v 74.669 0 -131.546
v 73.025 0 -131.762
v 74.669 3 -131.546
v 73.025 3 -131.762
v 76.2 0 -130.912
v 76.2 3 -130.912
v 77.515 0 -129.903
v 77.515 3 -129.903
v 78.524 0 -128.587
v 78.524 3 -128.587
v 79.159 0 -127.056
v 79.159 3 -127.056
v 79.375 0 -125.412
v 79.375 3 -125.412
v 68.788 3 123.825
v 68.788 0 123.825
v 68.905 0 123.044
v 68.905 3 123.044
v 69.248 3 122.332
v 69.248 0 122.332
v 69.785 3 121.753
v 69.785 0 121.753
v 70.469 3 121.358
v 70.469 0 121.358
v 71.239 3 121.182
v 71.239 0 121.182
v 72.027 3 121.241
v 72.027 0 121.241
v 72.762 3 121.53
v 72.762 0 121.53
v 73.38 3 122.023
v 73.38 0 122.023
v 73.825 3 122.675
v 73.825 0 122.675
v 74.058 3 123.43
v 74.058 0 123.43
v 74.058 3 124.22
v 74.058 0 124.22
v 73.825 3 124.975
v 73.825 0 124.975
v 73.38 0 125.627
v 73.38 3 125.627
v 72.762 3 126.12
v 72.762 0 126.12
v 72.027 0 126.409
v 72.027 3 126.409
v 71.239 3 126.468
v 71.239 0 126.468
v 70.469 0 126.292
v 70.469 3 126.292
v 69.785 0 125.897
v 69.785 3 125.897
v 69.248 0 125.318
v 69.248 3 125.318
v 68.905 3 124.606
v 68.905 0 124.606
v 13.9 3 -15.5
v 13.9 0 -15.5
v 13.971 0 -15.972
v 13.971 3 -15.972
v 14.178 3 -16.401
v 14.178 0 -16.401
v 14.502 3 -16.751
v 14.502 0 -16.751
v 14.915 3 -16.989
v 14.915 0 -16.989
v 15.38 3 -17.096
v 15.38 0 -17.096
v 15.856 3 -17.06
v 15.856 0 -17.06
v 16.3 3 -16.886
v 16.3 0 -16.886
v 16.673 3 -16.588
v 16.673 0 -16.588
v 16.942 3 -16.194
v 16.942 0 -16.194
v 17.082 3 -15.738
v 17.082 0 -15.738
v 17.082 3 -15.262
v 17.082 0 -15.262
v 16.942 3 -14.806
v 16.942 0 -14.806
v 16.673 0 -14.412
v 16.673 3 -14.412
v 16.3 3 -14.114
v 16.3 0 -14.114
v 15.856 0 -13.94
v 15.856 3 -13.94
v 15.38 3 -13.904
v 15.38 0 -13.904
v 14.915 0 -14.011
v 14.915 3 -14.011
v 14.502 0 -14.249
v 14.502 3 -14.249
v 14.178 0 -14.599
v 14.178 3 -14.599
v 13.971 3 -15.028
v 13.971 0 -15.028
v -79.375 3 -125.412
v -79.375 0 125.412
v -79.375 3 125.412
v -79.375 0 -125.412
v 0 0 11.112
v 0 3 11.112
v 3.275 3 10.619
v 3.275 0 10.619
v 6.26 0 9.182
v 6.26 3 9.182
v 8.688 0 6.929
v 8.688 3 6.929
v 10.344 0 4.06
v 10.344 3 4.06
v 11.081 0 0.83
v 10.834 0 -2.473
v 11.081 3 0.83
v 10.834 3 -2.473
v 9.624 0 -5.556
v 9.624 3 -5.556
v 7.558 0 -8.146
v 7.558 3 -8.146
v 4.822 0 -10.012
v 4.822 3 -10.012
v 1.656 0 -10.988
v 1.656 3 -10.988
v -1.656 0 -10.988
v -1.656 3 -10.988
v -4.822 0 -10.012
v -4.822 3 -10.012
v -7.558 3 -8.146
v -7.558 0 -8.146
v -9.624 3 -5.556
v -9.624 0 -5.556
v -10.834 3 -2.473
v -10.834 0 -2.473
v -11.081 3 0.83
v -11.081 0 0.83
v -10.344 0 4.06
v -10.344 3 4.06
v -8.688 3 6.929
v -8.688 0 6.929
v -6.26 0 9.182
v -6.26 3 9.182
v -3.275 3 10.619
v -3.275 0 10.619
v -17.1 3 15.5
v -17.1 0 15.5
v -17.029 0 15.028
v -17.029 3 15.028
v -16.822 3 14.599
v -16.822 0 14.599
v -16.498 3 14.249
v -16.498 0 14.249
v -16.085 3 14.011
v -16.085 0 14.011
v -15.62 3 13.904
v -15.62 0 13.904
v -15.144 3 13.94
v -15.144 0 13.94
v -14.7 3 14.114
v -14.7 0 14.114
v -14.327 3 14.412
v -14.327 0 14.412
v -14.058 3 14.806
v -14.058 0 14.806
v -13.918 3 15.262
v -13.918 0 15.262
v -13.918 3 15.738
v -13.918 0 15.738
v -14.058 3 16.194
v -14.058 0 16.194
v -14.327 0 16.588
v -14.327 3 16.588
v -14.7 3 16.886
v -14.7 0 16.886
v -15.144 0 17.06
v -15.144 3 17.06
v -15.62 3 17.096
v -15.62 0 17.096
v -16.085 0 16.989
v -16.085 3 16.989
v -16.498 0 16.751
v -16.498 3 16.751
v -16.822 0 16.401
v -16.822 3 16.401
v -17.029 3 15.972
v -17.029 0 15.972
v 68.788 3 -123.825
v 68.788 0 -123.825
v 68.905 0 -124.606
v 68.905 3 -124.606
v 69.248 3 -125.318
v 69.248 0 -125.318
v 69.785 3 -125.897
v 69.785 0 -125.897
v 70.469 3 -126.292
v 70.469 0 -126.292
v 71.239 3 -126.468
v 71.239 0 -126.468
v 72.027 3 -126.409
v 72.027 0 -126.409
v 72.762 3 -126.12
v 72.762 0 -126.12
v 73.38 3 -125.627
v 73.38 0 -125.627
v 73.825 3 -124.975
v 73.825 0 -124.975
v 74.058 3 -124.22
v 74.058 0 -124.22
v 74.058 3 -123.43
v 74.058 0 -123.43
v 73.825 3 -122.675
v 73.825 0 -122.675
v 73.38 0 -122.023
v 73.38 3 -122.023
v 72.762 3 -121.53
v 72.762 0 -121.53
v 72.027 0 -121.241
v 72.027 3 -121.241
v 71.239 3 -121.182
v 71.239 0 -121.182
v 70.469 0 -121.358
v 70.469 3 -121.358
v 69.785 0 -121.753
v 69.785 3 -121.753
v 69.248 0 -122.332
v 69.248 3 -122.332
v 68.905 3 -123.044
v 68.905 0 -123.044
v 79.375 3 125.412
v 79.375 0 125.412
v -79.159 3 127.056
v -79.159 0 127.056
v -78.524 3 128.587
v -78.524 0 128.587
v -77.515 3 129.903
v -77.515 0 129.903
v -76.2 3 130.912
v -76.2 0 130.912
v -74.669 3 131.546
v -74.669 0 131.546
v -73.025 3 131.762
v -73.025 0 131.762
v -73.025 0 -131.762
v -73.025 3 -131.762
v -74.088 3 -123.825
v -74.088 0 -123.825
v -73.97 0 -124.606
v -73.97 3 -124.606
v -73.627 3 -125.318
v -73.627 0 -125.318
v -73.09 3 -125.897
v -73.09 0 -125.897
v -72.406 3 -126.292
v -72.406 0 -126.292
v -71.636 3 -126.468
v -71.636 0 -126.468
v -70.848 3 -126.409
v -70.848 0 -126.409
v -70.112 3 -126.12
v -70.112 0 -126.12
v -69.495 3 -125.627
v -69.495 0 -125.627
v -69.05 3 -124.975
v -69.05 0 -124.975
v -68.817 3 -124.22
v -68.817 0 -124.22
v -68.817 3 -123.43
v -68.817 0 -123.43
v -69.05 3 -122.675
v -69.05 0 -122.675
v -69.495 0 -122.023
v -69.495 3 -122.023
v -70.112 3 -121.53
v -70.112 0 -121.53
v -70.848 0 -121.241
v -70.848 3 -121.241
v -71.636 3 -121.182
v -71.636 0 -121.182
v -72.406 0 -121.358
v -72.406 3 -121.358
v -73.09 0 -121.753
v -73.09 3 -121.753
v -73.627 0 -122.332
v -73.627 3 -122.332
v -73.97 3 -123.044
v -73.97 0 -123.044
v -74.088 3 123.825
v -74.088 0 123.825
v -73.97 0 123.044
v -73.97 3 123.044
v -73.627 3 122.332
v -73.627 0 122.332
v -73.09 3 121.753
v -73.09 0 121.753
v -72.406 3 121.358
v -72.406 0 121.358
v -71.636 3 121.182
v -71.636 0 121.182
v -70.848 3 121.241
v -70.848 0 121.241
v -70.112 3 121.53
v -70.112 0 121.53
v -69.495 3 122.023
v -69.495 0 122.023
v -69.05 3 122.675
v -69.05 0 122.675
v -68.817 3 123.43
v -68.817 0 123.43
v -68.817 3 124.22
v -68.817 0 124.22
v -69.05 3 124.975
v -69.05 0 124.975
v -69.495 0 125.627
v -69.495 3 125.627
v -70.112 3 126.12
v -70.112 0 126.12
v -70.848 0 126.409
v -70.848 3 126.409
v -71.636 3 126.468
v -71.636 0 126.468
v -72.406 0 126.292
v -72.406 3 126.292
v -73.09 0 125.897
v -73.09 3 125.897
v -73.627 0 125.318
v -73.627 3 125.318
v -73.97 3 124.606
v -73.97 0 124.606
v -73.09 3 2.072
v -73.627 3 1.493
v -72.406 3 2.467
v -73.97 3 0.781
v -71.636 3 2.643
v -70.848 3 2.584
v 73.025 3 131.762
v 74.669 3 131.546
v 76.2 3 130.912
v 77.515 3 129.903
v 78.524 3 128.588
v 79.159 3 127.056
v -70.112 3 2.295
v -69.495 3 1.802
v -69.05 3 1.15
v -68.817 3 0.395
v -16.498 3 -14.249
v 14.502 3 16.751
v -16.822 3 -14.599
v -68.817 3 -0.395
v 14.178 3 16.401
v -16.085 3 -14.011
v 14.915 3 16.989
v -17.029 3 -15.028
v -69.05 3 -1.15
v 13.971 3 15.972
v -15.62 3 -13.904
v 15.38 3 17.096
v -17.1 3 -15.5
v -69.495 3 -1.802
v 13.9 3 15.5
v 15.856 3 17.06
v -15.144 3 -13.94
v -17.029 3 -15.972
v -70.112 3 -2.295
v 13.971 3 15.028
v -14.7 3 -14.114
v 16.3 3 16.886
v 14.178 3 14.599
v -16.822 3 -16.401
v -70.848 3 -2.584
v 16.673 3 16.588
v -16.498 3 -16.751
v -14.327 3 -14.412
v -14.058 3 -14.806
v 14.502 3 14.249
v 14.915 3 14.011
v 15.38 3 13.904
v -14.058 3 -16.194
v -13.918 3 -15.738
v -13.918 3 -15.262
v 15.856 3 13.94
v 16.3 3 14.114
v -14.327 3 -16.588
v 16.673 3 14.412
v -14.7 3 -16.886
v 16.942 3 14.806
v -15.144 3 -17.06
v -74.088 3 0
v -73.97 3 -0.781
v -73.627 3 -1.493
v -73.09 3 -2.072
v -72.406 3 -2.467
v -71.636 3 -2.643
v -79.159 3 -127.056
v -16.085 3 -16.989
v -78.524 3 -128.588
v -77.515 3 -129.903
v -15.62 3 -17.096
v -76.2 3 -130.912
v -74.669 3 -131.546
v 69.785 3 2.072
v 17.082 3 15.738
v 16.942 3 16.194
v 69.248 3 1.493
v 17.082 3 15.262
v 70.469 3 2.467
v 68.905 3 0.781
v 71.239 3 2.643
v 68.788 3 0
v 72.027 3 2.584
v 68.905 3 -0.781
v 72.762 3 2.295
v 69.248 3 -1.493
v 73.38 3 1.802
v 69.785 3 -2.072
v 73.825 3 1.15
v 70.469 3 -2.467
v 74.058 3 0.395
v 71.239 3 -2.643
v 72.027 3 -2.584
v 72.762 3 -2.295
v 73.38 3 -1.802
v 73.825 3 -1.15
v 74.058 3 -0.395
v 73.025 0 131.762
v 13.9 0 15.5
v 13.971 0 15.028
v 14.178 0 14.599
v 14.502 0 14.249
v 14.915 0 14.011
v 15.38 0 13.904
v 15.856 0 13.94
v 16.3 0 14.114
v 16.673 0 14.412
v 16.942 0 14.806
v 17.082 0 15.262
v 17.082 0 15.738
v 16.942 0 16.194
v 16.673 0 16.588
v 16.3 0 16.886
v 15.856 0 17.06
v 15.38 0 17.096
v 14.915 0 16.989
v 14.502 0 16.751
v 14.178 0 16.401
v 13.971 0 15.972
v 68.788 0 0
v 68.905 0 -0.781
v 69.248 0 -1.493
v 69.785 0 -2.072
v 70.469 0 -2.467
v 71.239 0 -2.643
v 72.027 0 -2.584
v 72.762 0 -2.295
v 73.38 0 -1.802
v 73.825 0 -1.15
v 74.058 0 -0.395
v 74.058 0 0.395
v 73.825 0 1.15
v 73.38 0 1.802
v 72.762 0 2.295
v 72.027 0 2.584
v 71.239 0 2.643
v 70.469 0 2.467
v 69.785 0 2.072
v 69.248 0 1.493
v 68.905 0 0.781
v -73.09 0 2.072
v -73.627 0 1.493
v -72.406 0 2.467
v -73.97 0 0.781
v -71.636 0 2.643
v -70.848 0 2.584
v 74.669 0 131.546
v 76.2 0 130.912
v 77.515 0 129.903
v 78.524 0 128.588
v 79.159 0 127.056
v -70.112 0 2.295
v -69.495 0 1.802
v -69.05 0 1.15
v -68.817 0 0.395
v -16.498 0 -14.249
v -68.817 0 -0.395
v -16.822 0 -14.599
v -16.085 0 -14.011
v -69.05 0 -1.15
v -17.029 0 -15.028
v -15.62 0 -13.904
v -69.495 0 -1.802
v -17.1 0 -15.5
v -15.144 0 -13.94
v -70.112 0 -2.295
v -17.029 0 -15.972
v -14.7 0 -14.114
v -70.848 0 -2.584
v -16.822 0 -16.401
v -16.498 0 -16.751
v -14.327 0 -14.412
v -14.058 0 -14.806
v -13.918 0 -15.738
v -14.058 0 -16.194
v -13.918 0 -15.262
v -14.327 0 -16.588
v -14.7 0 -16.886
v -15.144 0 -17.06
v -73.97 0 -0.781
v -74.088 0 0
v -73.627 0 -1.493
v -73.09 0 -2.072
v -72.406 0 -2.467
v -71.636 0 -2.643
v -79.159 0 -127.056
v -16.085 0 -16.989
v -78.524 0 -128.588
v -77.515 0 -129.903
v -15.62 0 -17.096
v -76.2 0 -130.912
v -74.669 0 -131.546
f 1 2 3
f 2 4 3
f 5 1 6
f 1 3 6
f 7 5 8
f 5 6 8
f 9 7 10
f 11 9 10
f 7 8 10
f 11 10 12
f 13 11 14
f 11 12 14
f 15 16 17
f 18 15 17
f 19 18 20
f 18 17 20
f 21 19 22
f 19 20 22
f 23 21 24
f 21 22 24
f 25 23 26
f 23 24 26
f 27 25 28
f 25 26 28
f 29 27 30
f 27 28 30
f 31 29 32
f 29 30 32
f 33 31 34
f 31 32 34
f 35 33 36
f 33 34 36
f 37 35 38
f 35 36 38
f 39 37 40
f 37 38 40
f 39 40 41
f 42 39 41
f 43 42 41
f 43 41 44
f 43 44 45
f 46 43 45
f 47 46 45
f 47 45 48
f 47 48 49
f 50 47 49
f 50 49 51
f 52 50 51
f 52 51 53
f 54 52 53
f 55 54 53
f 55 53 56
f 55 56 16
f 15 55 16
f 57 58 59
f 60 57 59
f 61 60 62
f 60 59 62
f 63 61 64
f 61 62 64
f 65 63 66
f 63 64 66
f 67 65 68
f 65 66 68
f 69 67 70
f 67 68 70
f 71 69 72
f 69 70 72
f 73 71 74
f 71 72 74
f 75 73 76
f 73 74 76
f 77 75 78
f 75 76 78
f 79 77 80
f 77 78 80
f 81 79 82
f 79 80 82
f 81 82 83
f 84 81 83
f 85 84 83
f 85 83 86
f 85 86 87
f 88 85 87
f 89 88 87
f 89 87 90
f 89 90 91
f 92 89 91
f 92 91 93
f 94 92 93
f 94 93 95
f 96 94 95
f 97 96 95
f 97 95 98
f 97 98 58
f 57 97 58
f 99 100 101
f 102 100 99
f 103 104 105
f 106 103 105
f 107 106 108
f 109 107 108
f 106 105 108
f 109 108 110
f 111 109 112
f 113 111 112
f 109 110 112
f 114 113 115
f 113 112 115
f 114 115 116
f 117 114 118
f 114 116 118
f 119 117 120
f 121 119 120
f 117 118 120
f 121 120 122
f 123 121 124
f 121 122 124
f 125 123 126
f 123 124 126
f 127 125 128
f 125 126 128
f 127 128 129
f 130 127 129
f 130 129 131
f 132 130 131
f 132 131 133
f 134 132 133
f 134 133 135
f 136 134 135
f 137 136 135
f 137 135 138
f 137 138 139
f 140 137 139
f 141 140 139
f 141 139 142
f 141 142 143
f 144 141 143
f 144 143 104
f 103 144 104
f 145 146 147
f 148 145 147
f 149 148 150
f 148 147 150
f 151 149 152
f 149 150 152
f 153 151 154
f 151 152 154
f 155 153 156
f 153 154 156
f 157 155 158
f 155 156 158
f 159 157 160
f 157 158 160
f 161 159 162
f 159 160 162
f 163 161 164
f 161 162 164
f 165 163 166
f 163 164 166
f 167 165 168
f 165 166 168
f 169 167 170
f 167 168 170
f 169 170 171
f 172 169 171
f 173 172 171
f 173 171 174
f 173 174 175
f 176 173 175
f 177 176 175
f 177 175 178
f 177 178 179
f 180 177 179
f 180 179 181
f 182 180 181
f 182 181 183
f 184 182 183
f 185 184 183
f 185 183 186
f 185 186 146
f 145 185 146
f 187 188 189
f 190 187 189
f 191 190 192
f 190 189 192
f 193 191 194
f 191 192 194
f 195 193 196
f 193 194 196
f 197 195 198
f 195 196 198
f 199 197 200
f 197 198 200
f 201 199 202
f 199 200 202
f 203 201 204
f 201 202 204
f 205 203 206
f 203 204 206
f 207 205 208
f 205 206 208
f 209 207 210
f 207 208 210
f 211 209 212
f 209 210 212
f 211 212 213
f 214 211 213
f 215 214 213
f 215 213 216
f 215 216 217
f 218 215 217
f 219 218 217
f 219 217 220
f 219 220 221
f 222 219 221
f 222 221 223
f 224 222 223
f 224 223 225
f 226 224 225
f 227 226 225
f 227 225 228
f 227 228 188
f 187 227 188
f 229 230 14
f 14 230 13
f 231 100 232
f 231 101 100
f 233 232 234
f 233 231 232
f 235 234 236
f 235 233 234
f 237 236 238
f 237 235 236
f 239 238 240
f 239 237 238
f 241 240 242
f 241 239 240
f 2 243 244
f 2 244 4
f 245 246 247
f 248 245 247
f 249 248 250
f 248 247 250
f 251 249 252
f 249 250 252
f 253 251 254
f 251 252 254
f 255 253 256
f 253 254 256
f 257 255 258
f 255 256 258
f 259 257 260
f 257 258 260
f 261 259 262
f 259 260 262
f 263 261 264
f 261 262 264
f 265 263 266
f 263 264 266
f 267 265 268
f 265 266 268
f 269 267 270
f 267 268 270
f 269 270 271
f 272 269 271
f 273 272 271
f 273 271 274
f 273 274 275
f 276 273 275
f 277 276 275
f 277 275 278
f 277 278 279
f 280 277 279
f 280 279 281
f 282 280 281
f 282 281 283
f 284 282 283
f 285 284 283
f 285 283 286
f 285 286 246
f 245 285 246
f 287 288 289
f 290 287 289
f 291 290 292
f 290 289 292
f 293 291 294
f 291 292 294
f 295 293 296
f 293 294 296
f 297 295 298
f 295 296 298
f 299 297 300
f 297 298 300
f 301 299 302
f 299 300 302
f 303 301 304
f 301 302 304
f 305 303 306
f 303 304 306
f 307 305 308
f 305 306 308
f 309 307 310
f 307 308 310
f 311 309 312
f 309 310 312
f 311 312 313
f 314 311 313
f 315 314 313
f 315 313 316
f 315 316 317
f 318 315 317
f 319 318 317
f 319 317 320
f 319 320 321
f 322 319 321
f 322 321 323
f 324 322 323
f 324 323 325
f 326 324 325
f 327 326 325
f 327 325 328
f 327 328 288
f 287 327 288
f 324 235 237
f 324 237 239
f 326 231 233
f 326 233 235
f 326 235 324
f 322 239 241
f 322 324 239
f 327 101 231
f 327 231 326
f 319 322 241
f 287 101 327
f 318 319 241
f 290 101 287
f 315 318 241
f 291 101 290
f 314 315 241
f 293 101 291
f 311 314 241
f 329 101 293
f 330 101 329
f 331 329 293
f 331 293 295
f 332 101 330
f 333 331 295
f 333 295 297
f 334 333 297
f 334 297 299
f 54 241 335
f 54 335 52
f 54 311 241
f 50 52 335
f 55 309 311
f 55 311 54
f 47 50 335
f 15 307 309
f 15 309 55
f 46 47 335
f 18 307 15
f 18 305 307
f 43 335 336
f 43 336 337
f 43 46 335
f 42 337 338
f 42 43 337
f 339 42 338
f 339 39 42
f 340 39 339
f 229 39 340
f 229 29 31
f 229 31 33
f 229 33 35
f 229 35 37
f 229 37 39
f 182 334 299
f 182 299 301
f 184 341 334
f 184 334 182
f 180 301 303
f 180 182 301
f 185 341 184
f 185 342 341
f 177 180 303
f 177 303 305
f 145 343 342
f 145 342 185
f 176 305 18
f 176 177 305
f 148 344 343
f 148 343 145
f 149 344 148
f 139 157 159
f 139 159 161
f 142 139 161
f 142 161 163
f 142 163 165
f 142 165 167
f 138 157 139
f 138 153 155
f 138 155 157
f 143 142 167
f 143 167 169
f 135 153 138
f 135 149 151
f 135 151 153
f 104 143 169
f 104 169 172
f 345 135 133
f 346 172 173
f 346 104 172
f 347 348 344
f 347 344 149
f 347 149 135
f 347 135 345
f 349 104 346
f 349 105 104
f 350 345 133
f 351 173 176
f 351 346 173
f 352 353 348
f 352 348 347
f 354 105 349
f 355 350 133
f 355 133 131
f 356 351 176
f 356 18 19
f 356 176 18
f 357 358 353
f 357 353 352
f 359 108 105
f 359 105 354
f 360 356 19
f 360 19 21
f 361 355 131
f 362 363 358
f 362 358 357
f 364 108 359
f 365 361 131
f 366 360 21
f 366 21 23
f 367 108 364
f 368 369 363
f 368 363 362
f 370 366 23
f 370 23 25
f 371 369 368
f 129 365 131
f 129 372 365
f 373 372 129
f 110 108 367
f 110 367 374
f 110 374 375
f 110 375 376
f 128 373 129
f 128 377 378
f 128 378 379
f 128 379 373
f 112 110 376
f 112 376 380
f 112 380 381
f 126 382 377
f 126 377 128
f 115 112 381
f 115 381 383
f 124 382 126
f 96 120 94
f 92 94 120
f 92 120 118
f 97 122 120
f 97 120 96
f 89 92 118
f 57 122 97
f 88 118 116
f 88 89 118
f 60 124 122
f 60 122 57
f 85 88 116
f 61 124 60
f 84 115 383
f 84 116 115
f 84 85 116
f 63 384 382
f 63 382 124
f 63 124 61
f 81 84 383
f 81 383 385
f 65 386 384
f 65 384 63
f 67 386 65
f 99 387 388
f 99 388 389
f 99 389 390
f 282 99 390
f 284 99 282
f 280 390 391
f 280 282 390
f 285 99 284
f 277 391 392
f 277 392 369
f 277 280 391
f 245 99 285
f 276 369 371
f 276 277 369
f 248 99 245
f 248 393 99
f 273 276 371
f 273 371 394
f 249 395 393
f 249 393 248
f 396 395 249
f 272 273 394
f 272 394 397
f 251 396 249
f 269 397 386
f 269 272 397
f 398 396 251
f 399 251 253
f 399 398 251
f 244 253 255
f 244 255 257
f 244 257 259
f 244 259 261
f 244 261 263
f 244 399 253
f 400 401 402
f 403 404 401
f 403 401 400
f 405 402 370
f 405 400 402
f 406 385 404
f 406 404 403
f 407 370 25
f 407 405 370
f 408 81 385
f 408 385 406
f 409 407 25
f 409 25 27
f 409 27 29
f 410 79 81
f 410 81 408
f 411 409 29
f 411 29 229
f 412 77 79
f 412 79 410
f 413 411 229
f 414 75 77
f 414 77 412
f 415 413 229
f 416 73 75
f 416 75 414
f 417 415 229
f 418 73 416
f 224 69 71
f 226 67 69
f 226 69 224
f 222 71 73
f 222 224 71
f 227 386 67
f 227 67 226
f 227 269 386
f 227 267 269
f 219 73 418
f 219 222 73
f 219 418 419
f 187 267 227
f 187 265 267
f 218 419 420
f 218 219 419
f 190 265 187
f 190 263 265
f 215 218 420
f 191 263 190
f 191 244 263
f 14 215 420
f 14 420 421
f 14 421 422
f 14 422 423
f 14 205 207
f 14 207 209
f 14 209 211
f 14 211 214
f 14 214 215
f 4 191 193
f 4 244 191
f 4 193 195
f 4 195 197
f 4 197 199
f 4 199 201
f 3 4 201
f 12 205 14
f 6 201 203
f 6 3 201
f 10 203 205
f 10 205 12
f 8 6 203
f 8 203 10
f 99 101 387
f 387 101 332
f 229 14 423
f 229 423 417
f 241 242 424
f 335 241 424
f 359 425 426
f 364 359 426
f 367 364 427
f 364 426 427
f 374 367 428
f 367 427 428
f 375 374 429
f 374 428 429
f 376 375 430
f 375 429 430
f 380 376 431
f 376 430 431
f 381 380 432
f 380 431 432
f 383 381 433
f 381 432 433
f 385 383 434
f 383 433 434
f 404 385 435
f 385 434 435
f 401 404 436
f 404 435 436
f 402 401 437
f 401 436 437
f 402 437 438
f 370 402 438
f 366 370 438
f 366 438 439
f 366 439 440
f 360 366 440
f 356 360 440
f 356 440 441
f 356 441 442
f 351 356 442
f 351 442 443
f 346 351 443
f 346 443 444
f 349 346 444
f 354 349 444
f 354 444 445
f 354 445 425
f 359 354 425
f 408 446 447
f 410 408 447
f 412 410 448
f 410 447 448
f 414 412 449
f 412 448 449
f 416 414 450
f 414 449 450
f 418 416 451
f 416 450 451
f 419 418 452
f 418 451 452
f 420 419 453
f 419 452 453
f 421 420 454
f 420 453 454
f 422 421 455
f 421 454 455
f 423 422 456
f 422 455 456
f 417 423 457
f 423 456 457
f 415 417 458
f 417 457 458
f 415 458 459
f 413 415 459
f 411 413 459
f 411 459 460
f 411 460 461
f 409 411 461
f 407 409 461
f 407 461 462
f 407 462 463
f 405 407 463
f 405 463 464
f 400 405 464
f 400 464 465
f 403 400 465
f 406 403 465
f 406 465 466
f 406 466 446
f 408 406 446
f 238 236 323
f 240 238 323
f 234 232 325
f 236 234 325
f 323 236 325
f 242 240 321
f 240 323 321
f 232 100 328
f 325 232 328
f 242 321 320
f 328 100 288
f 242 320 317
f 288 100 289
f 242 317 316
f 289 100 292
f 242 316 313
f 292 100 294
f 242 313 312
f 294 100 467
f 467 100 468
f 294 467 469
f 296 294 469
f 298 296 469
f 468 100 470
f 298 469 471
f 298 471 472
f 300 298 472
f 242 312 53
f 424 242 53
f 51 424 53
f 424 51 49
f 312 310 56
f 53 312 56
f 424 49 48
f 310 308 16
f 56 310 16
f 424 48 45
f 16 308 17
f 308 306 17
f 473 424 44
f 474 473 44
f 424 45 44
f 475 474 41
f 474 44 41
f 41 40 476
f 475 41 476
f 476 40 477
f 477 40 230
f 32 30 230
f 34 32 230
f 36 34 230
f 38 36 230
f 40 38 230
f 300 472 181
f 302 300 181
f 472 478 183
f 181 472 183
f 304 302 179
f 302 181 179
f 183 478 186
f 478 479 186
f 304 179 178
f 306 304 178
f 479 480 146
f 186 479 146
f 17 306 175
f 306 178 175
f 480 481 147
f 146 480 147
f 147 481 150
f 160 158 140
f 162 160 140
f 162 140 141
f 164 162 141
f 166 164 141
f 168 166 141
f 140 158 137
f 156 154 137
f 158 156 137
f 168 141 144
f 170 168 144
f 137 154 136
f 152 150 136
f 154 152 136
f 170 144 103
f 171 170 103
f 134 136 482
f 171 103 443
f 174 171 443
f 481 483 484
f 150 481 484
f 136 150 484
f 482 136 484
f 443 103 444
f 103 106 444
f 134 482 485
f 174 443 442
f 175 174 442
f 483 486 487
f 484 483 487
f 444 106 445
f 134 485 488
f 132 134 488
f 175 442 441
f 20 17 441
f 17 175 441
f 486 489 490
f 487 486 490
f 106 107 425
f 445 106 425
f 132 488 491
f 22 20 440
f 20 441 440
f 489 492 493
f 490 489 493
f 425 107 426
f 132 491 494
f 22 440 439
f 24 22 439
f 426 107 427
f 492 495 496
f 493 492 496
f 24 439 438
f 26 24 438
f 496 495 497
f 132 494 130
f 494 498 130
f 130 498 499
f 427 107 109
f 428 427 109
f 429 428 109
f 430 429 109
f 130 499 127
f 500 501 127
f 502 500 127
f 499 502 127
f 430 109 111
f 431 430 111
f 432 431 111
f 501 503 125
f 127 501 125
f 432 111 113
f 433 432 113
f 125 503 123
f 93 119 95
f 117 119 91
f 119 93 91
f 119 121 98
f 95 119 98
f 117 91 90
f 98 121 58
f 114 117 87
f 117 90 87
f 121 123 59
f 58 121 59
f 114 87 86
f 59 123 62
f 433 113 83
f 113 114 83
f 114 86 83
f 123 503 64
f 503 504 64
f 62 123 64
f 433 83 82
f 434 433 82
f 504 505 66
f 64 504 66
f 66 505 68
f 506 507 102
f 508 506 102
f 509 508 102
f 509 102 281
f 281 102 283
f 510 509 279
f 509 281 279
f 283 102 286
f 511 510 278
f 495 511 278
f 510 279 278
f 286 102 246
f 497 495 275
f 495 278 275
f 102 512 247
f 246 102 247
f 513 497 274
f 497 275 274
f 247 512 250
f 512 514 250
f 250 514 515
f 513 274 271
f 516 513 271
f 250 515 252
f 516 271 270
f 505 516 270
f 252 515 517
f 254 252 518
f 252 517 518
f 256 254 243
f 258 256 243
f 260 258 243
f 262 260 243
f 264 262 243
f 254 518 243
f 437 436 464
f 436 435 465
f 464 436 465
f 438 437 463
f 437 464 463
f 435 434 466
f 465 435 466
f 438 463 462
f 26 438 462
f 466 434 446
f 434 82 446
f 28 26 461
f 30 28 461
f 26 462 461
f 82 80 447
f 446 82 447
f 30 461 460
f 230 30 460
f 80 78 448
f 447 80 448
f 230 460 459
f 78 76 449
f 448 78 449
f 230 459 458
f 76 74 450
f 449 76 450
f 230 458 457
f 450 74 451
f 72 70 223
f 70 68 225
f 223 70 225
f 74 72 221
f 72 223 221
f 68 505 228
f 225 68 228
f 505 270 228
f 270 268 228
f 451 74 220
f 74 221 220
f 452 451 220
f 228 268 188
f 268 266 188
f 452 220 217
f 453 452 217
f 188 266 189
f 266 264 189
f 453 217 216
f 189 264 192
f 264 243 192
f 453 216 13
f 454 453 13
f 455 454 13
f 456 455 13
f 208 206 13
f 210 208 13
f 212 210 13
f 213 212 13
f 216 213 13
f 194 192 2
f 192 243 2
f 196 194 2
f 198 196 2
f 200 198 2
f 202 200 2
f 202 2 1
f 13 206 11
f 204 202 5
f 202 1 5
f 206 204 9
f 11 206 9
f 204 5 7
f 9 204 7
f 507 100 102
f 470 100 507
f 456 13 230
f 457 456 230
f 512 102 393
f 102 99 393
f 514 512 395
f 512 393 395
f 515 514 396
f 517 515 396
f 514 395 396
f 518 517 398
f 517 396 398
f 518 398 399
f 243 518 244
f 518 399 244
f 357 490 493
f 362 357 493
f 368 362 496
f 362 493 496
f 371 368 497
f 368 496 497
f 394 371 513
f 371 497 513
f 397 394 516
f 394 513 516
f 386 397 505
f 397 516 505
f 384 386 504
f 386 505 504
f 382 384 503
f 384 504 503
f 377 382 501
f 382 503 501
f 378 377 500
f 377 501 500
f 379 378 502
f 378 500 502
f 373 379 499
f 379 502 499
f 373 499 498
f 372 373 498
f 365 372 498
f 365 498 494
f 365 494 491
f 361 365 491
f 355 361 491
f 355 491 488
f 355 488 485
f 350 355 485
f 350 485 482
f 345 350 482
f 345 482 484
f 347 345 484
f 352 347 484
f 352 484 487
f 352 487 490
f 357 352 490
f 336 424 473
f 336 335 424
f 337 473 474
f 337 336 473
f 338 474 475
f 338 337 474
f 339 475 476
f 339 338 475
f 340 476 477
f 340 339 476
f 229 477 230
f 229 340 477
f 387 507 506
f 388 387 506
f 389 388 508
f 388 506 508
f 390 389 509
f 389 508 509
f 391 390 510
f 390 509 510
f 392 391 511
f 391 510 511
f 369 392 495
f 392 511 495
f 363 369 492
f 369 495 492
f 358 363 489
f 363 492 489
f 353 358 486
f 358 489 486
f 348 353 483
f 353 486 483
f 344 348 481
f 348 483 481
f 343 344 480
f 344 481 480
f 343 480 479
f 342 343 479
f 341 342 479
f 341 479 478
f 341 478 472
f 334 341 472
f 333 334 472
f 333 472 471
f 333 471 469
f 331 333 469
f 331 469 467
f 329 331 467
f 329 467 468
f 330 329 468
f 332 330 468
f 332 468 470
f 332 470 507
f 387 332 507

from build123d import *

# Parameters (mm, degrees)
SKETCH1_W                = 158.75
SKETCH1_H                = 263.525
BOSS_EXTRUDE1_DEPTH      = 3
SKETCH5_R                = 11.1125
CUT_EXTRUDE1_DEPTH       = 154.853004622
M3_CLEARANCE_HOLE1_D     = 3.2
M3_CLEARANCE_HOLE1_DEPTH = 3
M5_CLEARANCE_HOLE2_D     = 5.3
M5_CLEARANCE_HOLE2_DEPTH = 3
FILLET1_R                = 6.35


with BuildPart() as part:
    # Sketch1 → Boss-Extrude1 (new body)
    with BuildSketch(Plane(origin=(0, 0, 0), x_dir=(1, 0, 0), z_dir=(0, 1, 0))):
        Rectangle(SKETCH1_W, SKETCH1_H)
    extrude(amount=BOSS_EXTRUDE1_DEPTH)

    # Sketch5 → Cut-Extrude1 (cut, through all)
    with BuildSketch(Plane(origin=(0, 3, 0), x_dir=(1, 0, 0), z_dir=(0, 1, 0))):
        with Locations(Location((0, 0, 0), (0, 0, 270))):
            Circle(SKETCH5_R)
    extrude(amount=-CUT_EXTRUDE1_DEPTH, mode=Mode.SUBTRACT)

    # M3 Clearance Hole1
    with Locations(Plane(origin=(0, 3, 0), x_dir=(1, 0, 0), z_dir=(0, 1, 0))):
        with Locations((0, 0), (15.5, 15.5), (-15.5, -15.5), (-15.5, 15.5), (15.5, -15.5)):
            Hole(M3_CLEARANCE_HOLE1_D / 2, depth=M3_CLEARANCE_HOLE1_DEPTH)

    # M5 Clearance Hole2
    with Locations(Plane(origin=(0, 3, 0), x_dir=(1, 0, 0), z_dir=(0, 1, 0))):
        with Locations((0, 0), (71.4375, 123.825), (-71.4375, -123.825), (-71.4375, 123.825), (71.4375, -123.825), (-71.4375, 0), (71.4375, 0)):
            Hole(M5_CLEARANCE_HOLE2_D / 2, depth=M5_CLEARANCE_HOLE2_DEPTH)

    # Fillet1
    fillet1_edges = [part.edges().sort_by_distance(p)[0] for p in [
        (79.375, 1.5, 131.7625),
        (-79.375, 1.5, 131.7625),
        (-79.375, 1.5, -131.7625),
        (79.375, 1.5, -131.7625),
    ]]
    fillet(fillet1_edges, radius=FILLET1_R)


solid = part.part
